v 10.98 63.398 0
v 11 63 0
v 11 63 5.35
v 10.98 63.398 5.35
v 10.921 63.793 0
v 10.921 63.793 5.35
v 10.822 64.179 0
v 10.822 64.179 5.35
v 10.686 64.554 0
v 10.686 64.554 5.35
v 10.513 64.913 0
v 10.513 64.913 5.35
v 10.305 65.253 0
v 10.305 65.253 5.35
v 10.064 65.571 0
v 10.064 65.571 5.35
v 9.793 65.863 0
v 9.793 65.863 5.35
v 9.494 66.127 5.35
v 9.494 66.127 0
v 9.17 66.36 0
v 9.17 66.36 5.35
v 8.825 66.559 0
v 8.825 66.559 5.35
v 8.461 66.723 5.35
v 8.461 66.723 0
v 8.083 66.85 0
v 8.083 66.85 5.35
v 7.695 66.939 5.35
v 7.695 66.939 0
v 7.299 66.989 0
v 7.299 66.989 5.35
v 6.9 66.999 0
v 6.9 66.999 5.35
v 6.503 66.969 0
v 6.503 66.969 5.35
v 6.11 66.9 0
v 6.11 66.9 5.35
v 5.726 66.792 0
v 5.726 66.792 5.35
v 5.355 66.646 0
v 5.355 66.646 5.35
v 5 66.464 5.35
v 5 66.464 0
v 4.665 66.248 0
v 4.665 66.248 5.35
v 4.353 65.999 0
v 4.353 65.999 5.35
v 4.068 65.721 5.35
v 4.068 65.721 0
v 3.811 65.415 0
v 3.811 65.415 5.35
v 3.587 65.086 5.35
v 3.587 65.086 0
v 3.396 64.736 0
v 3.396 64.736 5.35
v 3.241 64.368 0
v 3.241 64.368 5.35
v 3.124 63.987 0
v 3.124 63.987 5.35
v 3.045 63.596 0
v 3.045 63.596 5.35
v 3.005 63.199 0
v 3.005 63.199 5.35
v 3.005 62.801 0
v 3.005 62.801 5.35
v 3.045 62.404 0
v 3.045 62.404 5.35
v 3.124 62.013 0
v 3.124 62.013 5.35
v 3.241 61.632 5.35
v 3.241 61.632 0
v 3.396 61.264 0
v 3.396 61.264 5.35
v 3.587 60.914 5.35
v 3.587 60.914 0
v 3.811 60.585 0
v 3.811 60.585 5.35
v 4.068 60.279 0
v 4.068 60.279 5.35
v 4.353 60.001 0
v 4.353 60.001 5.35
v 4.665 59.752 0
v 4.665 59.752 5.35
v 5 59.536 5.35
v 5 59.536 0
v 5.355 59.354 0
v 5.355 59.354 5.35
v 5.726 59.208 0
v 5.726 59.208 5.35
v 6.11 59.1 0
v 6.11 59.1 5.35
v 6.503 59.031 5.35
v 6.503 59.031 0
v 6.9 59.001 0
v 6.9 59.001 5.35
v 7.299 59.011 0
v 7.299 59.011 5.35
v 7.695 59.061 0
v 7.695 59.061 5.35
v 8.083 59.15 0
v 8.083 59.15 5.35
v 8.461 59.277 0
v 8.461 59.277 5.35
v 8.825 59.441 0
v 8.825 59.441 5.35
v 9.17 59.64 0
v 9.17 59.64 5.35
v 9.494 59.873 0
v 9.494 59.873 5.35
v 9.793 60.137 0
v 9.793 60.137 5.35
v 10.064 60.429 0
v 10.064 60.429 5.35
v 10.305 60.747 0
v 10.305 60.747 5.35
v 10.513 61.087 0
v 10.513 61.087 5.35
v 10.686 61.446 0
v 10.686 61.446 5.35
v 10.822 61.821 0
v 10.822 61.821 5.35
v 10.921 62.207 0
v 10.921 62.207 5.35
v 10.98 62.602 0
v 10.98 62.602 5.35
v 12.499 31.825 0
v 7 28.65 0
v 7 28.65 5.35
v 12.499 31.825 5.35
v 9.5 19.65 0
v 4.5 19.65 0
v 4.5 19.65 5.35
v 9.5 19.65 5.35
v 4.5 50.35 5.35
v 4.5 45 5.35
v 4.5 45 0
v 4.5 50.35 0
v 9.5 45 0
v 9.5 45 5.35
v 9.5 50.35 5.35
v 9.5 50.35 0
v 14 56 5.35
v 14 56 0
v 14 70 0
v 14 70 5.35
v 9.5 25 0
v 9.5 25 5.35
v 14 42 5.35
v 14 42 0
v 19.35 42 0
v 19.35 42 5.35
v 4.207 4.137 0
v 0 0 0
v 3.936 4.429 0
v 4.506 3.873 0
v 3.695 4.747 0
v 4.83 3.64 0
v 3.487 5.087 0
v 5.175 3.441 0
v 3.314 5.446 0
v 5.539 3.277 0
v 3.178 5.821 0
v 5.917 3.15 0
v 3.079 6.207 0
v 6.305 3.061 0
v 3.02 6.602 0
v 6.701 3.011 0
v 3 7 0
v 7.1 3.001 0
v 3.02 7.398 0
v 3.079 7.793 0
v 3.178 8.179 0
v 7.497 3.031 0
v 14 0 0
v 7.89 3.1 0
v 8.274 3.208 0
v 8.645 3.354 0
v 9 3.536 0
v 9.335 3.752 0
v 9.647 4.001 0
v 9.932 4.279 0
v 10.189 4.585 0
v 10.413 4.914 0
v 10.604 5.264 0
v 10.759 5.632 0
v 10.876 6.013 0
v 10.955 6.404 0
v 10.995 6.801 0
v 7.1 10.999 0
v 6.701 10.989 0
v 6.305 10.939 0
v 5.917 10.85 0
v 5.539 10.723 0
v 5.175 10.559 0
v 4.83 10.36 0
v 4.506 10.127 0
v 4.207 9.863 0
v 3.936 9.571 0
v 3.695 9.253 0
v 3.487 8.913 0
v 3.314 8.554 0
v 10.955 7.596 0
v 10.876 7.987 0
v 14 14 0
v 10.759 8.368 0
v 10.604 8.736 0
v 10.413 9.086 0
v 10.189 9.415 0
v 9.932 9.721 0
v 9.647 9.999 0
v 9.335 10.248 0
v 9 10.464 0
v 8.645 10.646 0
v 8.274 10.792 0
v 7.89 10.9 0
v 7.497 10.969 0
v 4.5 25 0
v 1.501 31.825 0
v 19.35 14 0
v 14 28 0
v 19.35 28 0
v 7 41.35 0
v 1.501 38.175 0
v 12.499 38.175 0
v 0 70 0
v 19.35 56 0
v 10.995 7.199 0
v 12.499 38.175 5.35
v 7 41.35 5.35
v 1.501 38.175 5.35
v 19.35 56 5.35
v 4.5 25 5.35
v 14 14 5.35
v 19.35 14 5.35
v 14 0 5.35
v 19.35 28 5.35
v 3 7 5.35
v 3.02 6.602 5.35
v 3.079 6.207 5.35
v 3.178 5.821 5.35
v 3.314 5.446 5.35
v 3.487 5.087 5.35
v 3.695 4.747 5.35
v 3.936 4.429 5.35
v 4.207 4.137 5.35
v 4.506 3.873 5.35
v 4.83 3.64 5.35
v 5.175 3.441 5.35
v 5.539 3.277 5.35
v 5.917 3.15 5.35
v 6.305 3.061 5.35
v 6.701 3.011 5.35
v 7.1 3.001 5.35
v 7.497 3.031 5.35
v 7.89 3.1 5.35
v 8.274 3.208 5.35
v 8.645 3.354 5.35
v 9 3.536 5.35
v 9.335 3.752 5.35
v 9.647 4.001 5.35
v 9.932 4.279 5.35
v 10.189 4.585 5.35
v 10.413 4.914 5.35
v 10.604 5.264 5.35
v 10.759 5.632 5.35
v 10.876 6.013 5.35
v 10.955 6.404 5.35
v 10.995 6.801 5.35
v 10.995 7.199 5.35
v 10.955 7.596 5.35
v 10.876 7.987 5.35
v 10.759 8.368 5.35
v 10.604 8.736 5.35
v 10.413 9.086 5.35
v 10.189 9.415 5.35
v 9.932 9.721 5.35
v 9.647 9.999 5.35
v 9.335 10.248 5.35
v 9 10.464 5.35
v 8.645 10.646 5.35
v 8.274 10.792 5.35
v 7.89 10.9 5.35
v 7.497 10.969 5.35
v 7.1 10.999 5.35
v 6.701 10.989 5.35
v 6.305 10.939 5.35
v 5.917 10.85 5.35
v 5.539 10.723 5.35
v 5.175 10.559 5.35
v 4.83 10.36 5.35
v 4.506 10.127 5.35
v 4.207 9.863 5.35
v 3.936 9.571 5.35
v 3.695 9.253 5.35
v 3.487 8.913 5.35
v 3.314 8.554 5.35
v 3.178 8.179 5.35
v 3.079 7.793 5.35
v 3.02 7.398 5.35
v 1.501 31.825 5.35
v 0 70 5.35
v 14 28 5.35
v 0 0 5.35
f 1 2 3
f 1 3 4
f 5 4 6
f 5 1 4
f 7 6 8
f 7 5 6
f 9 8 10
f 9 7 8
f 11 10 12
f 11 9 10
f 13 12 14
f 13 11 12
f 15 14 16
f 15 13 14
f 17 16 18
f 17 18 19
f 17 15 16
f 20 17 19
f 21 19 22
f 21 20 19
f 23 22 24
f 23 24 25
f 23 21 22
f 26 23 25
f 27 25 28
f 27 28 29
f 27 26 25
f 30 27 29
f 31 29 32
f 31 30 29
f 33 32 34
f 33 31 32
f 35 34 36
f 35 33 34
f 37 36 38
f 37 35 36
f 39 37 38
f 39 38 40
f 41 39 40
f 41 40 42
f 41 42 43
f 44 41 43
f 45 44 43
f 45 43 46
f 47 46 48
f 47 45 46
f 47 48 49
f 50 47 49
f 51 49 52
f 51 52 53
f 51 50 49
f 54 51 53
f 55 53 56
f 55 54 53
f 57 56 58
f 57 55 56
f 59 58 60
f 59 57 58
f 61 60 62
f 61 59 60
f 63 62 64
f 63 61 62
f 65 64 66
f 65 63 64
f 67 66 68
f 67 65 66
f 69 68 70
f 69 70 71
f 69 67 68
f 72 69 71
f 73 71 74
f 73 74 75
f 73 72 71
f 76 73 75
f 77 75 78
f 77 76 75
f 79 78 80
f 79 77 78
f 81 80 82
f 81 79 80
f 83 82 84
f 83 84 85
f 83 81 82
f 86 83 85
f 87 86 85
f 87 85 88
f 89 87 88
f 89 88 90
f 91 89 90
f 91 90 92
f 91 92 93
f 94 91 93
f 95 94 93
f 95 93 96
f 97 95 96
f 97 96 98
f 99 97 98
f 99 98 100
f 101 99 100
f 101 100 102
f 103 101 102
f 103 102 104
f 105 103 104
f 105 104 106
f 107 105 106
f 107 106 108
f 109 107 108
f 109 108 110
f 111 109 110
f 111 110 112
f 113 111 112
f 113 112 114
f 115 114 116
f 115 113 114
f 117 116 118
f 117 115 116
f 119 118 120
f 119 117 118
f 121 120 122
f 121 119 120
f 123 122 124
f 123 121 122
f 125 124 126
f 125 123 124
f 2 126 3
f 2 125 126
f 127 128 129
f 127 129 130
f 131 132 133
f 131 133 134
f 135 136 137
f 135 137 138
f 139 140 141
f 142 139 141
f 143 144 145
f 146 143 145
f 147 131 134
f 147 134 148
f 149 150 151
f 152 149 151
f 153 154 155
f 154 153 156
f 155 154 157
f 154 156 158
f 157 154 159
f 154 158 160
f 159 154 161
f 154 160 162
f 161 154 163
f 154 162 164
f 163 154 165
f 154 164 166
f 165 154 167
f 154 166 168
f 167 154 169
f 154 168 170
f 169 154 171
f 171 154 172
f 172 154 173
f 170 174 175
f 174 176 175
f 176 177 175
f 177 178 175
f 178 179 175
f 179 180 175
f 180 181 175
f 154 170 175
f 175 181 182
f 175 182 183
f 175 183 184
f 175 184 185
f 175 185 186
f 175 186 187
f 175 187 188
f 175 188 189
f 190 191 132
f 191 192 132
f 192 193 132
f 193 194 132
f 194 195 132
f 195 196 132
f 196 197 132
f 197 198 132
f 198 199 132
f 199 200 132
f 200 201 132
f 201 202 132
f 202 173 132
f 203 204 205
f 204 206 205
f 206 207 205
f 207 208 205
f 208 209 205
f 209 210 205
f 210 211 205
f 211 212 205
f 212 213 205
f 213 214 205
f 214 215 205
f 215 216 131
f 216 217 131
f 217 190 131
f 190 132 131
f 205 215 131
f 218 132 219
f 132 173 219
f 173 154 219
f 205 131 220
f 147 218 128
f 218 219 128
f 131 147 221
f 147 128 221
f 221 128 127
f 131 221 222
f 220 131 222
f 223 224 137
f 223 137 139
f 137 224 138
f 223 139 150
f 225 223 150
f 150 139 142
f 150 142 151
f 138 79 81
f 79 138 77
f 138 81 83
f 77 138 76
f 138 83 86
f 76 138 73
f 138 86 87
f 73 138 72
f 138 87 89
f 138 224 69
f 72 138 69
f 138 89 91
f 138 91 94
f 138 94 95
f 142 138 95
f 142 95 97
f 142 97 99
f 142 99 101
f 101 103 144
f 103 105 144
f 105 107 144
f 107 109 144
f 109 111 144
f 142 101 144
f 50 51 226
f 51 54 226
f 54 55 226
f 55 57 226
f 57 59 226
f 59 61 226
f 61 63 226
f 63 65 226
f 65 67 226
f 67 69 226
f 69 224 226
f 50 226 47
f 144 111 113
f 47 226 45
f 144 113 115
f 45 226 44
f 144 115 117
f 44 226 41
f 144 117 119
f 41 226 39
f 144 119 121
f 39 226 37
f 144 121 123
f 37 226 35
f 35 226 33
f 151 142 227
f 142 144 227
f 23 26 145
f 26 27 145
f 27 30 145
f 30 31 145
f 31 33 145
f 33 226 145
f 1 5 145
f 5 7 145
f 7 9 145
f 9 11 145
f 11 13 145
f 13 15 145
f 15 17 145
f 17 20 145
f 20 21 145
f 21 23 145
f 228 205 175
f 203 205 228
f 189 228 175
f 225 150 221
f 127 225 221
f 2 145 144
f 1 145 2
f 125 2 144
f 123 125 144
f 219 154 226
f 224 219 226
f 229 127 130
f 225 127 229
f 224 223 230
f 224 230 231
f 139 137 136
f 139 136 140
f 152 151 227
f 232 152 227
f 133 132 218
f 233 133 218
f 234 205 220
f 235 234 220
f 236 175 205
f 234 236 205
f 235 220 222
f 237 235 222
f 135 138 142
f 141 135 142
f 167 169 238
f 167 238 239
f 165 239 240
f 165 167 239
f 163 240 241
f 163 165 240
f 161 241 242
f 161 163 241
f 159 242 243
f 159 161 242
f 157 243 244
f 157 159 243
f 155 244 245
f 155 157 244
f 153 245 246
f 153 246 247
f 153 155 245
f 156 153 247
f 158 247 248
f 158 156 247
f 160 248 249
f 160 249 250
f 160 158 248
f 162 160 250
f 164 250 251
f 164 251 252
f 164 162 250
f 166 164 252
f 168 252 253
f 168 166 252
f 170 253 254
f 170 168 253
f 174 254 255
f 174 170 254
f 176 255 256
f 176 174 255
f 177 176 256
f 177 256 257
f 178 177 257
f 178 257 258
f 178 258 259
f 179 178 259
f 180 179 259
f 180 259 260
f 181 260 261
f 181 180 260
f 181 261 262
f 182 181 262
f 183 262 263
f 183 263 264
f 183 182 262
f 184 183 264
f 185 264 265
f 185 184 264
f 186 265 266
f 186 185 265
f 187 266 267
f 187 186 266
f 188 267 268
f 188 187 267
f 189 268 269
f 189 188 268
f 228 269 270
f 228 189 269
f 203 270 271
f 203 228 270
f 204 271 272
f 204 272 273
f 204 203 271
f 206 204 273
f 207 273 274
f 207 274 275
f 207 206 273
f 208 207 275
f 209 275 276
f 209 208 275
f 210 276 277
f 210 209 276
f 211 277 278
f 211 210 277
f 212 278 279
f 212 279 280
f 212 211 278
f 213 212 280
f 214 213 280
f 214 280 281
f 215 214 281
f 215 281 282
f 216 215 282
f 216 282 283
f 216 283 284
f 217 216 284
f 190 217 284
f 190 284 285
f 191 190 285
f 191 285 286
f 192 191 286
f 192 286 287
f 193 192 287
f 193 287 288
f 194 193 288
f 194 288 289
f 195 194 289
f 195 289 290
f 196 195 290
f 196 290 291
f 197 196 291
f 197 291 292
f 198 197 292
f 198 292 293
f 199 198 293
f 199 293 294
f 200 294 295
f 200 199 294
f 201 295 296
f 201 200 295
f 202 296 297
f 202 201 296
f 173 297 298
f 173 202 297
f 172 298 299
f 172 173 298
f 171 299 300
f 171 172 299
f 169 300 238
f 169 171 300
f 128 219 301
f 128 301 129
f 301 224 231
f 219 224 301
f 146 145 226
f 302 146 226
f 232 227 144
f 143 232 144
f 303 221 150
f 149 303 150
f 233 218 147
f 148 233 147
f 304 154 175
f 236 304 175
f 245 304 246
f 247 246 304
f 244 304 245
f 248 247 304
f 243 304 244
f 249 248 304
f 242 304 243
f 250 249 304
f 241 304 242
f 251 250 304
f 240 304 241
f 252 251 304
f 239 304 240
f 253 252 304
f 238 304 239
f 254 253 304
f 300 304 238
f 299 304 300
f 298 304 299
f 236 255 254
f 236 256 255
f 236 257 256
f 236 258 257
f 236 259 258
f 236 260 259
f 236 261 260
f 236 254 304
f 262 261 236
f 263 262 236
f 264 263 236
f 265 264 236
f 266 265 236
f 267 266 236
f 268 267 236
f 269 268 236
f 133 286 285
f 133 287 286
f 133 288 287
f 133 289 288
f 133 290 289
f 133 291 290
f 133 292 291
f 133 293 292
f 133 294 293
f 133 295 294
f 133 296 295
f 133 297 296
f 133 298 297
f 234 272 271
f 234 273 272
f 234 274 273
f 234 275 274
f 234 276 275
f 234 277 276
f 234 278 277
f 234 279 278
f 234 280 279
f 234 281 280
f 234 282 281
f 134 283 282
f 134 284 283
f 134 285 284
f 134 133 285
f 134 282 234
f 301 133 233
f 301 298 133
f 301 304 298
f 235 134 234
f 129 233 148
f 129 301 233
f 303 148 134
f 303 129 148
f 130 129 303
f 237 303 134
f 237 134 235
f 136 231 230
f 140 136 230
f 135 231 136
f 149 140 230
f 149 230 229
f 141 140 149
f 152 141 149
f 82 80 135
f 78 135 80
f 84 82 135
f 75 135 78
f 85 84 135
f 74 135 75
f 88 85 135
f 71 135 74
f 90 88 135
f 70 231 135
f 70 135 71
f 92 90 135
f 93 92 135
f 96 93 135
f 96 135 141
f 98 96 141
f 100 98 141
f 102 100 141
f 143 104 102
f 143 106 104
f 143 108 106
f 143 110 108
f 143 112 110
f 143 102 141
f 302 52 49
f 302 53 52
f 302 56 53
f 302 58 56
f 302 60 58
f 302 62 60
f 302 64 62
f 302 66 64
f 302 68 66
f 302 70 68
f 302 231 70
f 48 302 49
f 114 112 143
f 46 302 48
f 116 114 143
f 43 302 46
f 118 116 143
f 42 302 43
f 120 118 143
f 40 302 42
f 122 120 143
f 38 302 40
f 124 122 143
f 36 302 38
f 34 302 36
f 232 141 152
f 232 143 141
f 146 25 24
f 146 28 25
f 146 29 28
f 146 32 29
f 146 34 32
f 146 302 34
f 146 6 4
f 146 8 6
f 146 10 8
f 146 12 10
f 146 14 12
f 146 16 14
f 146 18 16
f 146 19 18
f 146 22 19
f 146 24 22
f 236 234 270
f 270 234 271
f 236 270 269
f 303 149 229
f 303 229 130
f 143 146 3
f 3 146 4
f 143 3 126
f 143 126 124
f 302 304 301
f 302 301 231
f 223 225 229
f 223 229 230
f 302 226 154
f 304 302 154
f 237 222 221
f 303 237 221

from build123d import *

# Parameters (mm, degrees)
MODEL_R             = 4
MODEL_W             = 5
MODEL_H             = 5.35
BOSS_EXTRUDE1_DEPTH = 5.35


with BuildPart() as part:
    # Model → Boss-Extrude1 (new body)
    with BuildSketch(Plane.XY):
        Polygon((0, 0), (14, 0), (14, 14), (19.35, 14), (19.35, 28), (14, 28), (14, 42), (19.35, 42), (19.35, 56), (14, 56), (14, 70), (0, 70), align=None)
        with Locations((7, 63)):
            Circle(MODEL_R, mode=Mode.SUBTRACT)
        with Locations(Location((7, 7, 0), (0, 0, 180))):
            Circle(MODEL_R, mode=Mode.SUBTRACT)
        with Locations((7, 47.675)):
            Rectangle(MODEL_W, MODEL_H, mode=Mode.SUBTRACT)
        with Locations((7, 22.325)):
            Rectangle(MODEL_W, MODEL_H, mode=Mode.SUBTRACT)
        Polygon((1.500738686, 38.175), (1.500738686, 31.825), (7, 28.65), (12.499261314, 31.825), (12.499261314, 38.175), (7, 41.35), align=None, mode=Mode.SUBTRACT)
    extrude(amount=BOSS_EXTRUDE1_DEPTH)


solid = part.part
